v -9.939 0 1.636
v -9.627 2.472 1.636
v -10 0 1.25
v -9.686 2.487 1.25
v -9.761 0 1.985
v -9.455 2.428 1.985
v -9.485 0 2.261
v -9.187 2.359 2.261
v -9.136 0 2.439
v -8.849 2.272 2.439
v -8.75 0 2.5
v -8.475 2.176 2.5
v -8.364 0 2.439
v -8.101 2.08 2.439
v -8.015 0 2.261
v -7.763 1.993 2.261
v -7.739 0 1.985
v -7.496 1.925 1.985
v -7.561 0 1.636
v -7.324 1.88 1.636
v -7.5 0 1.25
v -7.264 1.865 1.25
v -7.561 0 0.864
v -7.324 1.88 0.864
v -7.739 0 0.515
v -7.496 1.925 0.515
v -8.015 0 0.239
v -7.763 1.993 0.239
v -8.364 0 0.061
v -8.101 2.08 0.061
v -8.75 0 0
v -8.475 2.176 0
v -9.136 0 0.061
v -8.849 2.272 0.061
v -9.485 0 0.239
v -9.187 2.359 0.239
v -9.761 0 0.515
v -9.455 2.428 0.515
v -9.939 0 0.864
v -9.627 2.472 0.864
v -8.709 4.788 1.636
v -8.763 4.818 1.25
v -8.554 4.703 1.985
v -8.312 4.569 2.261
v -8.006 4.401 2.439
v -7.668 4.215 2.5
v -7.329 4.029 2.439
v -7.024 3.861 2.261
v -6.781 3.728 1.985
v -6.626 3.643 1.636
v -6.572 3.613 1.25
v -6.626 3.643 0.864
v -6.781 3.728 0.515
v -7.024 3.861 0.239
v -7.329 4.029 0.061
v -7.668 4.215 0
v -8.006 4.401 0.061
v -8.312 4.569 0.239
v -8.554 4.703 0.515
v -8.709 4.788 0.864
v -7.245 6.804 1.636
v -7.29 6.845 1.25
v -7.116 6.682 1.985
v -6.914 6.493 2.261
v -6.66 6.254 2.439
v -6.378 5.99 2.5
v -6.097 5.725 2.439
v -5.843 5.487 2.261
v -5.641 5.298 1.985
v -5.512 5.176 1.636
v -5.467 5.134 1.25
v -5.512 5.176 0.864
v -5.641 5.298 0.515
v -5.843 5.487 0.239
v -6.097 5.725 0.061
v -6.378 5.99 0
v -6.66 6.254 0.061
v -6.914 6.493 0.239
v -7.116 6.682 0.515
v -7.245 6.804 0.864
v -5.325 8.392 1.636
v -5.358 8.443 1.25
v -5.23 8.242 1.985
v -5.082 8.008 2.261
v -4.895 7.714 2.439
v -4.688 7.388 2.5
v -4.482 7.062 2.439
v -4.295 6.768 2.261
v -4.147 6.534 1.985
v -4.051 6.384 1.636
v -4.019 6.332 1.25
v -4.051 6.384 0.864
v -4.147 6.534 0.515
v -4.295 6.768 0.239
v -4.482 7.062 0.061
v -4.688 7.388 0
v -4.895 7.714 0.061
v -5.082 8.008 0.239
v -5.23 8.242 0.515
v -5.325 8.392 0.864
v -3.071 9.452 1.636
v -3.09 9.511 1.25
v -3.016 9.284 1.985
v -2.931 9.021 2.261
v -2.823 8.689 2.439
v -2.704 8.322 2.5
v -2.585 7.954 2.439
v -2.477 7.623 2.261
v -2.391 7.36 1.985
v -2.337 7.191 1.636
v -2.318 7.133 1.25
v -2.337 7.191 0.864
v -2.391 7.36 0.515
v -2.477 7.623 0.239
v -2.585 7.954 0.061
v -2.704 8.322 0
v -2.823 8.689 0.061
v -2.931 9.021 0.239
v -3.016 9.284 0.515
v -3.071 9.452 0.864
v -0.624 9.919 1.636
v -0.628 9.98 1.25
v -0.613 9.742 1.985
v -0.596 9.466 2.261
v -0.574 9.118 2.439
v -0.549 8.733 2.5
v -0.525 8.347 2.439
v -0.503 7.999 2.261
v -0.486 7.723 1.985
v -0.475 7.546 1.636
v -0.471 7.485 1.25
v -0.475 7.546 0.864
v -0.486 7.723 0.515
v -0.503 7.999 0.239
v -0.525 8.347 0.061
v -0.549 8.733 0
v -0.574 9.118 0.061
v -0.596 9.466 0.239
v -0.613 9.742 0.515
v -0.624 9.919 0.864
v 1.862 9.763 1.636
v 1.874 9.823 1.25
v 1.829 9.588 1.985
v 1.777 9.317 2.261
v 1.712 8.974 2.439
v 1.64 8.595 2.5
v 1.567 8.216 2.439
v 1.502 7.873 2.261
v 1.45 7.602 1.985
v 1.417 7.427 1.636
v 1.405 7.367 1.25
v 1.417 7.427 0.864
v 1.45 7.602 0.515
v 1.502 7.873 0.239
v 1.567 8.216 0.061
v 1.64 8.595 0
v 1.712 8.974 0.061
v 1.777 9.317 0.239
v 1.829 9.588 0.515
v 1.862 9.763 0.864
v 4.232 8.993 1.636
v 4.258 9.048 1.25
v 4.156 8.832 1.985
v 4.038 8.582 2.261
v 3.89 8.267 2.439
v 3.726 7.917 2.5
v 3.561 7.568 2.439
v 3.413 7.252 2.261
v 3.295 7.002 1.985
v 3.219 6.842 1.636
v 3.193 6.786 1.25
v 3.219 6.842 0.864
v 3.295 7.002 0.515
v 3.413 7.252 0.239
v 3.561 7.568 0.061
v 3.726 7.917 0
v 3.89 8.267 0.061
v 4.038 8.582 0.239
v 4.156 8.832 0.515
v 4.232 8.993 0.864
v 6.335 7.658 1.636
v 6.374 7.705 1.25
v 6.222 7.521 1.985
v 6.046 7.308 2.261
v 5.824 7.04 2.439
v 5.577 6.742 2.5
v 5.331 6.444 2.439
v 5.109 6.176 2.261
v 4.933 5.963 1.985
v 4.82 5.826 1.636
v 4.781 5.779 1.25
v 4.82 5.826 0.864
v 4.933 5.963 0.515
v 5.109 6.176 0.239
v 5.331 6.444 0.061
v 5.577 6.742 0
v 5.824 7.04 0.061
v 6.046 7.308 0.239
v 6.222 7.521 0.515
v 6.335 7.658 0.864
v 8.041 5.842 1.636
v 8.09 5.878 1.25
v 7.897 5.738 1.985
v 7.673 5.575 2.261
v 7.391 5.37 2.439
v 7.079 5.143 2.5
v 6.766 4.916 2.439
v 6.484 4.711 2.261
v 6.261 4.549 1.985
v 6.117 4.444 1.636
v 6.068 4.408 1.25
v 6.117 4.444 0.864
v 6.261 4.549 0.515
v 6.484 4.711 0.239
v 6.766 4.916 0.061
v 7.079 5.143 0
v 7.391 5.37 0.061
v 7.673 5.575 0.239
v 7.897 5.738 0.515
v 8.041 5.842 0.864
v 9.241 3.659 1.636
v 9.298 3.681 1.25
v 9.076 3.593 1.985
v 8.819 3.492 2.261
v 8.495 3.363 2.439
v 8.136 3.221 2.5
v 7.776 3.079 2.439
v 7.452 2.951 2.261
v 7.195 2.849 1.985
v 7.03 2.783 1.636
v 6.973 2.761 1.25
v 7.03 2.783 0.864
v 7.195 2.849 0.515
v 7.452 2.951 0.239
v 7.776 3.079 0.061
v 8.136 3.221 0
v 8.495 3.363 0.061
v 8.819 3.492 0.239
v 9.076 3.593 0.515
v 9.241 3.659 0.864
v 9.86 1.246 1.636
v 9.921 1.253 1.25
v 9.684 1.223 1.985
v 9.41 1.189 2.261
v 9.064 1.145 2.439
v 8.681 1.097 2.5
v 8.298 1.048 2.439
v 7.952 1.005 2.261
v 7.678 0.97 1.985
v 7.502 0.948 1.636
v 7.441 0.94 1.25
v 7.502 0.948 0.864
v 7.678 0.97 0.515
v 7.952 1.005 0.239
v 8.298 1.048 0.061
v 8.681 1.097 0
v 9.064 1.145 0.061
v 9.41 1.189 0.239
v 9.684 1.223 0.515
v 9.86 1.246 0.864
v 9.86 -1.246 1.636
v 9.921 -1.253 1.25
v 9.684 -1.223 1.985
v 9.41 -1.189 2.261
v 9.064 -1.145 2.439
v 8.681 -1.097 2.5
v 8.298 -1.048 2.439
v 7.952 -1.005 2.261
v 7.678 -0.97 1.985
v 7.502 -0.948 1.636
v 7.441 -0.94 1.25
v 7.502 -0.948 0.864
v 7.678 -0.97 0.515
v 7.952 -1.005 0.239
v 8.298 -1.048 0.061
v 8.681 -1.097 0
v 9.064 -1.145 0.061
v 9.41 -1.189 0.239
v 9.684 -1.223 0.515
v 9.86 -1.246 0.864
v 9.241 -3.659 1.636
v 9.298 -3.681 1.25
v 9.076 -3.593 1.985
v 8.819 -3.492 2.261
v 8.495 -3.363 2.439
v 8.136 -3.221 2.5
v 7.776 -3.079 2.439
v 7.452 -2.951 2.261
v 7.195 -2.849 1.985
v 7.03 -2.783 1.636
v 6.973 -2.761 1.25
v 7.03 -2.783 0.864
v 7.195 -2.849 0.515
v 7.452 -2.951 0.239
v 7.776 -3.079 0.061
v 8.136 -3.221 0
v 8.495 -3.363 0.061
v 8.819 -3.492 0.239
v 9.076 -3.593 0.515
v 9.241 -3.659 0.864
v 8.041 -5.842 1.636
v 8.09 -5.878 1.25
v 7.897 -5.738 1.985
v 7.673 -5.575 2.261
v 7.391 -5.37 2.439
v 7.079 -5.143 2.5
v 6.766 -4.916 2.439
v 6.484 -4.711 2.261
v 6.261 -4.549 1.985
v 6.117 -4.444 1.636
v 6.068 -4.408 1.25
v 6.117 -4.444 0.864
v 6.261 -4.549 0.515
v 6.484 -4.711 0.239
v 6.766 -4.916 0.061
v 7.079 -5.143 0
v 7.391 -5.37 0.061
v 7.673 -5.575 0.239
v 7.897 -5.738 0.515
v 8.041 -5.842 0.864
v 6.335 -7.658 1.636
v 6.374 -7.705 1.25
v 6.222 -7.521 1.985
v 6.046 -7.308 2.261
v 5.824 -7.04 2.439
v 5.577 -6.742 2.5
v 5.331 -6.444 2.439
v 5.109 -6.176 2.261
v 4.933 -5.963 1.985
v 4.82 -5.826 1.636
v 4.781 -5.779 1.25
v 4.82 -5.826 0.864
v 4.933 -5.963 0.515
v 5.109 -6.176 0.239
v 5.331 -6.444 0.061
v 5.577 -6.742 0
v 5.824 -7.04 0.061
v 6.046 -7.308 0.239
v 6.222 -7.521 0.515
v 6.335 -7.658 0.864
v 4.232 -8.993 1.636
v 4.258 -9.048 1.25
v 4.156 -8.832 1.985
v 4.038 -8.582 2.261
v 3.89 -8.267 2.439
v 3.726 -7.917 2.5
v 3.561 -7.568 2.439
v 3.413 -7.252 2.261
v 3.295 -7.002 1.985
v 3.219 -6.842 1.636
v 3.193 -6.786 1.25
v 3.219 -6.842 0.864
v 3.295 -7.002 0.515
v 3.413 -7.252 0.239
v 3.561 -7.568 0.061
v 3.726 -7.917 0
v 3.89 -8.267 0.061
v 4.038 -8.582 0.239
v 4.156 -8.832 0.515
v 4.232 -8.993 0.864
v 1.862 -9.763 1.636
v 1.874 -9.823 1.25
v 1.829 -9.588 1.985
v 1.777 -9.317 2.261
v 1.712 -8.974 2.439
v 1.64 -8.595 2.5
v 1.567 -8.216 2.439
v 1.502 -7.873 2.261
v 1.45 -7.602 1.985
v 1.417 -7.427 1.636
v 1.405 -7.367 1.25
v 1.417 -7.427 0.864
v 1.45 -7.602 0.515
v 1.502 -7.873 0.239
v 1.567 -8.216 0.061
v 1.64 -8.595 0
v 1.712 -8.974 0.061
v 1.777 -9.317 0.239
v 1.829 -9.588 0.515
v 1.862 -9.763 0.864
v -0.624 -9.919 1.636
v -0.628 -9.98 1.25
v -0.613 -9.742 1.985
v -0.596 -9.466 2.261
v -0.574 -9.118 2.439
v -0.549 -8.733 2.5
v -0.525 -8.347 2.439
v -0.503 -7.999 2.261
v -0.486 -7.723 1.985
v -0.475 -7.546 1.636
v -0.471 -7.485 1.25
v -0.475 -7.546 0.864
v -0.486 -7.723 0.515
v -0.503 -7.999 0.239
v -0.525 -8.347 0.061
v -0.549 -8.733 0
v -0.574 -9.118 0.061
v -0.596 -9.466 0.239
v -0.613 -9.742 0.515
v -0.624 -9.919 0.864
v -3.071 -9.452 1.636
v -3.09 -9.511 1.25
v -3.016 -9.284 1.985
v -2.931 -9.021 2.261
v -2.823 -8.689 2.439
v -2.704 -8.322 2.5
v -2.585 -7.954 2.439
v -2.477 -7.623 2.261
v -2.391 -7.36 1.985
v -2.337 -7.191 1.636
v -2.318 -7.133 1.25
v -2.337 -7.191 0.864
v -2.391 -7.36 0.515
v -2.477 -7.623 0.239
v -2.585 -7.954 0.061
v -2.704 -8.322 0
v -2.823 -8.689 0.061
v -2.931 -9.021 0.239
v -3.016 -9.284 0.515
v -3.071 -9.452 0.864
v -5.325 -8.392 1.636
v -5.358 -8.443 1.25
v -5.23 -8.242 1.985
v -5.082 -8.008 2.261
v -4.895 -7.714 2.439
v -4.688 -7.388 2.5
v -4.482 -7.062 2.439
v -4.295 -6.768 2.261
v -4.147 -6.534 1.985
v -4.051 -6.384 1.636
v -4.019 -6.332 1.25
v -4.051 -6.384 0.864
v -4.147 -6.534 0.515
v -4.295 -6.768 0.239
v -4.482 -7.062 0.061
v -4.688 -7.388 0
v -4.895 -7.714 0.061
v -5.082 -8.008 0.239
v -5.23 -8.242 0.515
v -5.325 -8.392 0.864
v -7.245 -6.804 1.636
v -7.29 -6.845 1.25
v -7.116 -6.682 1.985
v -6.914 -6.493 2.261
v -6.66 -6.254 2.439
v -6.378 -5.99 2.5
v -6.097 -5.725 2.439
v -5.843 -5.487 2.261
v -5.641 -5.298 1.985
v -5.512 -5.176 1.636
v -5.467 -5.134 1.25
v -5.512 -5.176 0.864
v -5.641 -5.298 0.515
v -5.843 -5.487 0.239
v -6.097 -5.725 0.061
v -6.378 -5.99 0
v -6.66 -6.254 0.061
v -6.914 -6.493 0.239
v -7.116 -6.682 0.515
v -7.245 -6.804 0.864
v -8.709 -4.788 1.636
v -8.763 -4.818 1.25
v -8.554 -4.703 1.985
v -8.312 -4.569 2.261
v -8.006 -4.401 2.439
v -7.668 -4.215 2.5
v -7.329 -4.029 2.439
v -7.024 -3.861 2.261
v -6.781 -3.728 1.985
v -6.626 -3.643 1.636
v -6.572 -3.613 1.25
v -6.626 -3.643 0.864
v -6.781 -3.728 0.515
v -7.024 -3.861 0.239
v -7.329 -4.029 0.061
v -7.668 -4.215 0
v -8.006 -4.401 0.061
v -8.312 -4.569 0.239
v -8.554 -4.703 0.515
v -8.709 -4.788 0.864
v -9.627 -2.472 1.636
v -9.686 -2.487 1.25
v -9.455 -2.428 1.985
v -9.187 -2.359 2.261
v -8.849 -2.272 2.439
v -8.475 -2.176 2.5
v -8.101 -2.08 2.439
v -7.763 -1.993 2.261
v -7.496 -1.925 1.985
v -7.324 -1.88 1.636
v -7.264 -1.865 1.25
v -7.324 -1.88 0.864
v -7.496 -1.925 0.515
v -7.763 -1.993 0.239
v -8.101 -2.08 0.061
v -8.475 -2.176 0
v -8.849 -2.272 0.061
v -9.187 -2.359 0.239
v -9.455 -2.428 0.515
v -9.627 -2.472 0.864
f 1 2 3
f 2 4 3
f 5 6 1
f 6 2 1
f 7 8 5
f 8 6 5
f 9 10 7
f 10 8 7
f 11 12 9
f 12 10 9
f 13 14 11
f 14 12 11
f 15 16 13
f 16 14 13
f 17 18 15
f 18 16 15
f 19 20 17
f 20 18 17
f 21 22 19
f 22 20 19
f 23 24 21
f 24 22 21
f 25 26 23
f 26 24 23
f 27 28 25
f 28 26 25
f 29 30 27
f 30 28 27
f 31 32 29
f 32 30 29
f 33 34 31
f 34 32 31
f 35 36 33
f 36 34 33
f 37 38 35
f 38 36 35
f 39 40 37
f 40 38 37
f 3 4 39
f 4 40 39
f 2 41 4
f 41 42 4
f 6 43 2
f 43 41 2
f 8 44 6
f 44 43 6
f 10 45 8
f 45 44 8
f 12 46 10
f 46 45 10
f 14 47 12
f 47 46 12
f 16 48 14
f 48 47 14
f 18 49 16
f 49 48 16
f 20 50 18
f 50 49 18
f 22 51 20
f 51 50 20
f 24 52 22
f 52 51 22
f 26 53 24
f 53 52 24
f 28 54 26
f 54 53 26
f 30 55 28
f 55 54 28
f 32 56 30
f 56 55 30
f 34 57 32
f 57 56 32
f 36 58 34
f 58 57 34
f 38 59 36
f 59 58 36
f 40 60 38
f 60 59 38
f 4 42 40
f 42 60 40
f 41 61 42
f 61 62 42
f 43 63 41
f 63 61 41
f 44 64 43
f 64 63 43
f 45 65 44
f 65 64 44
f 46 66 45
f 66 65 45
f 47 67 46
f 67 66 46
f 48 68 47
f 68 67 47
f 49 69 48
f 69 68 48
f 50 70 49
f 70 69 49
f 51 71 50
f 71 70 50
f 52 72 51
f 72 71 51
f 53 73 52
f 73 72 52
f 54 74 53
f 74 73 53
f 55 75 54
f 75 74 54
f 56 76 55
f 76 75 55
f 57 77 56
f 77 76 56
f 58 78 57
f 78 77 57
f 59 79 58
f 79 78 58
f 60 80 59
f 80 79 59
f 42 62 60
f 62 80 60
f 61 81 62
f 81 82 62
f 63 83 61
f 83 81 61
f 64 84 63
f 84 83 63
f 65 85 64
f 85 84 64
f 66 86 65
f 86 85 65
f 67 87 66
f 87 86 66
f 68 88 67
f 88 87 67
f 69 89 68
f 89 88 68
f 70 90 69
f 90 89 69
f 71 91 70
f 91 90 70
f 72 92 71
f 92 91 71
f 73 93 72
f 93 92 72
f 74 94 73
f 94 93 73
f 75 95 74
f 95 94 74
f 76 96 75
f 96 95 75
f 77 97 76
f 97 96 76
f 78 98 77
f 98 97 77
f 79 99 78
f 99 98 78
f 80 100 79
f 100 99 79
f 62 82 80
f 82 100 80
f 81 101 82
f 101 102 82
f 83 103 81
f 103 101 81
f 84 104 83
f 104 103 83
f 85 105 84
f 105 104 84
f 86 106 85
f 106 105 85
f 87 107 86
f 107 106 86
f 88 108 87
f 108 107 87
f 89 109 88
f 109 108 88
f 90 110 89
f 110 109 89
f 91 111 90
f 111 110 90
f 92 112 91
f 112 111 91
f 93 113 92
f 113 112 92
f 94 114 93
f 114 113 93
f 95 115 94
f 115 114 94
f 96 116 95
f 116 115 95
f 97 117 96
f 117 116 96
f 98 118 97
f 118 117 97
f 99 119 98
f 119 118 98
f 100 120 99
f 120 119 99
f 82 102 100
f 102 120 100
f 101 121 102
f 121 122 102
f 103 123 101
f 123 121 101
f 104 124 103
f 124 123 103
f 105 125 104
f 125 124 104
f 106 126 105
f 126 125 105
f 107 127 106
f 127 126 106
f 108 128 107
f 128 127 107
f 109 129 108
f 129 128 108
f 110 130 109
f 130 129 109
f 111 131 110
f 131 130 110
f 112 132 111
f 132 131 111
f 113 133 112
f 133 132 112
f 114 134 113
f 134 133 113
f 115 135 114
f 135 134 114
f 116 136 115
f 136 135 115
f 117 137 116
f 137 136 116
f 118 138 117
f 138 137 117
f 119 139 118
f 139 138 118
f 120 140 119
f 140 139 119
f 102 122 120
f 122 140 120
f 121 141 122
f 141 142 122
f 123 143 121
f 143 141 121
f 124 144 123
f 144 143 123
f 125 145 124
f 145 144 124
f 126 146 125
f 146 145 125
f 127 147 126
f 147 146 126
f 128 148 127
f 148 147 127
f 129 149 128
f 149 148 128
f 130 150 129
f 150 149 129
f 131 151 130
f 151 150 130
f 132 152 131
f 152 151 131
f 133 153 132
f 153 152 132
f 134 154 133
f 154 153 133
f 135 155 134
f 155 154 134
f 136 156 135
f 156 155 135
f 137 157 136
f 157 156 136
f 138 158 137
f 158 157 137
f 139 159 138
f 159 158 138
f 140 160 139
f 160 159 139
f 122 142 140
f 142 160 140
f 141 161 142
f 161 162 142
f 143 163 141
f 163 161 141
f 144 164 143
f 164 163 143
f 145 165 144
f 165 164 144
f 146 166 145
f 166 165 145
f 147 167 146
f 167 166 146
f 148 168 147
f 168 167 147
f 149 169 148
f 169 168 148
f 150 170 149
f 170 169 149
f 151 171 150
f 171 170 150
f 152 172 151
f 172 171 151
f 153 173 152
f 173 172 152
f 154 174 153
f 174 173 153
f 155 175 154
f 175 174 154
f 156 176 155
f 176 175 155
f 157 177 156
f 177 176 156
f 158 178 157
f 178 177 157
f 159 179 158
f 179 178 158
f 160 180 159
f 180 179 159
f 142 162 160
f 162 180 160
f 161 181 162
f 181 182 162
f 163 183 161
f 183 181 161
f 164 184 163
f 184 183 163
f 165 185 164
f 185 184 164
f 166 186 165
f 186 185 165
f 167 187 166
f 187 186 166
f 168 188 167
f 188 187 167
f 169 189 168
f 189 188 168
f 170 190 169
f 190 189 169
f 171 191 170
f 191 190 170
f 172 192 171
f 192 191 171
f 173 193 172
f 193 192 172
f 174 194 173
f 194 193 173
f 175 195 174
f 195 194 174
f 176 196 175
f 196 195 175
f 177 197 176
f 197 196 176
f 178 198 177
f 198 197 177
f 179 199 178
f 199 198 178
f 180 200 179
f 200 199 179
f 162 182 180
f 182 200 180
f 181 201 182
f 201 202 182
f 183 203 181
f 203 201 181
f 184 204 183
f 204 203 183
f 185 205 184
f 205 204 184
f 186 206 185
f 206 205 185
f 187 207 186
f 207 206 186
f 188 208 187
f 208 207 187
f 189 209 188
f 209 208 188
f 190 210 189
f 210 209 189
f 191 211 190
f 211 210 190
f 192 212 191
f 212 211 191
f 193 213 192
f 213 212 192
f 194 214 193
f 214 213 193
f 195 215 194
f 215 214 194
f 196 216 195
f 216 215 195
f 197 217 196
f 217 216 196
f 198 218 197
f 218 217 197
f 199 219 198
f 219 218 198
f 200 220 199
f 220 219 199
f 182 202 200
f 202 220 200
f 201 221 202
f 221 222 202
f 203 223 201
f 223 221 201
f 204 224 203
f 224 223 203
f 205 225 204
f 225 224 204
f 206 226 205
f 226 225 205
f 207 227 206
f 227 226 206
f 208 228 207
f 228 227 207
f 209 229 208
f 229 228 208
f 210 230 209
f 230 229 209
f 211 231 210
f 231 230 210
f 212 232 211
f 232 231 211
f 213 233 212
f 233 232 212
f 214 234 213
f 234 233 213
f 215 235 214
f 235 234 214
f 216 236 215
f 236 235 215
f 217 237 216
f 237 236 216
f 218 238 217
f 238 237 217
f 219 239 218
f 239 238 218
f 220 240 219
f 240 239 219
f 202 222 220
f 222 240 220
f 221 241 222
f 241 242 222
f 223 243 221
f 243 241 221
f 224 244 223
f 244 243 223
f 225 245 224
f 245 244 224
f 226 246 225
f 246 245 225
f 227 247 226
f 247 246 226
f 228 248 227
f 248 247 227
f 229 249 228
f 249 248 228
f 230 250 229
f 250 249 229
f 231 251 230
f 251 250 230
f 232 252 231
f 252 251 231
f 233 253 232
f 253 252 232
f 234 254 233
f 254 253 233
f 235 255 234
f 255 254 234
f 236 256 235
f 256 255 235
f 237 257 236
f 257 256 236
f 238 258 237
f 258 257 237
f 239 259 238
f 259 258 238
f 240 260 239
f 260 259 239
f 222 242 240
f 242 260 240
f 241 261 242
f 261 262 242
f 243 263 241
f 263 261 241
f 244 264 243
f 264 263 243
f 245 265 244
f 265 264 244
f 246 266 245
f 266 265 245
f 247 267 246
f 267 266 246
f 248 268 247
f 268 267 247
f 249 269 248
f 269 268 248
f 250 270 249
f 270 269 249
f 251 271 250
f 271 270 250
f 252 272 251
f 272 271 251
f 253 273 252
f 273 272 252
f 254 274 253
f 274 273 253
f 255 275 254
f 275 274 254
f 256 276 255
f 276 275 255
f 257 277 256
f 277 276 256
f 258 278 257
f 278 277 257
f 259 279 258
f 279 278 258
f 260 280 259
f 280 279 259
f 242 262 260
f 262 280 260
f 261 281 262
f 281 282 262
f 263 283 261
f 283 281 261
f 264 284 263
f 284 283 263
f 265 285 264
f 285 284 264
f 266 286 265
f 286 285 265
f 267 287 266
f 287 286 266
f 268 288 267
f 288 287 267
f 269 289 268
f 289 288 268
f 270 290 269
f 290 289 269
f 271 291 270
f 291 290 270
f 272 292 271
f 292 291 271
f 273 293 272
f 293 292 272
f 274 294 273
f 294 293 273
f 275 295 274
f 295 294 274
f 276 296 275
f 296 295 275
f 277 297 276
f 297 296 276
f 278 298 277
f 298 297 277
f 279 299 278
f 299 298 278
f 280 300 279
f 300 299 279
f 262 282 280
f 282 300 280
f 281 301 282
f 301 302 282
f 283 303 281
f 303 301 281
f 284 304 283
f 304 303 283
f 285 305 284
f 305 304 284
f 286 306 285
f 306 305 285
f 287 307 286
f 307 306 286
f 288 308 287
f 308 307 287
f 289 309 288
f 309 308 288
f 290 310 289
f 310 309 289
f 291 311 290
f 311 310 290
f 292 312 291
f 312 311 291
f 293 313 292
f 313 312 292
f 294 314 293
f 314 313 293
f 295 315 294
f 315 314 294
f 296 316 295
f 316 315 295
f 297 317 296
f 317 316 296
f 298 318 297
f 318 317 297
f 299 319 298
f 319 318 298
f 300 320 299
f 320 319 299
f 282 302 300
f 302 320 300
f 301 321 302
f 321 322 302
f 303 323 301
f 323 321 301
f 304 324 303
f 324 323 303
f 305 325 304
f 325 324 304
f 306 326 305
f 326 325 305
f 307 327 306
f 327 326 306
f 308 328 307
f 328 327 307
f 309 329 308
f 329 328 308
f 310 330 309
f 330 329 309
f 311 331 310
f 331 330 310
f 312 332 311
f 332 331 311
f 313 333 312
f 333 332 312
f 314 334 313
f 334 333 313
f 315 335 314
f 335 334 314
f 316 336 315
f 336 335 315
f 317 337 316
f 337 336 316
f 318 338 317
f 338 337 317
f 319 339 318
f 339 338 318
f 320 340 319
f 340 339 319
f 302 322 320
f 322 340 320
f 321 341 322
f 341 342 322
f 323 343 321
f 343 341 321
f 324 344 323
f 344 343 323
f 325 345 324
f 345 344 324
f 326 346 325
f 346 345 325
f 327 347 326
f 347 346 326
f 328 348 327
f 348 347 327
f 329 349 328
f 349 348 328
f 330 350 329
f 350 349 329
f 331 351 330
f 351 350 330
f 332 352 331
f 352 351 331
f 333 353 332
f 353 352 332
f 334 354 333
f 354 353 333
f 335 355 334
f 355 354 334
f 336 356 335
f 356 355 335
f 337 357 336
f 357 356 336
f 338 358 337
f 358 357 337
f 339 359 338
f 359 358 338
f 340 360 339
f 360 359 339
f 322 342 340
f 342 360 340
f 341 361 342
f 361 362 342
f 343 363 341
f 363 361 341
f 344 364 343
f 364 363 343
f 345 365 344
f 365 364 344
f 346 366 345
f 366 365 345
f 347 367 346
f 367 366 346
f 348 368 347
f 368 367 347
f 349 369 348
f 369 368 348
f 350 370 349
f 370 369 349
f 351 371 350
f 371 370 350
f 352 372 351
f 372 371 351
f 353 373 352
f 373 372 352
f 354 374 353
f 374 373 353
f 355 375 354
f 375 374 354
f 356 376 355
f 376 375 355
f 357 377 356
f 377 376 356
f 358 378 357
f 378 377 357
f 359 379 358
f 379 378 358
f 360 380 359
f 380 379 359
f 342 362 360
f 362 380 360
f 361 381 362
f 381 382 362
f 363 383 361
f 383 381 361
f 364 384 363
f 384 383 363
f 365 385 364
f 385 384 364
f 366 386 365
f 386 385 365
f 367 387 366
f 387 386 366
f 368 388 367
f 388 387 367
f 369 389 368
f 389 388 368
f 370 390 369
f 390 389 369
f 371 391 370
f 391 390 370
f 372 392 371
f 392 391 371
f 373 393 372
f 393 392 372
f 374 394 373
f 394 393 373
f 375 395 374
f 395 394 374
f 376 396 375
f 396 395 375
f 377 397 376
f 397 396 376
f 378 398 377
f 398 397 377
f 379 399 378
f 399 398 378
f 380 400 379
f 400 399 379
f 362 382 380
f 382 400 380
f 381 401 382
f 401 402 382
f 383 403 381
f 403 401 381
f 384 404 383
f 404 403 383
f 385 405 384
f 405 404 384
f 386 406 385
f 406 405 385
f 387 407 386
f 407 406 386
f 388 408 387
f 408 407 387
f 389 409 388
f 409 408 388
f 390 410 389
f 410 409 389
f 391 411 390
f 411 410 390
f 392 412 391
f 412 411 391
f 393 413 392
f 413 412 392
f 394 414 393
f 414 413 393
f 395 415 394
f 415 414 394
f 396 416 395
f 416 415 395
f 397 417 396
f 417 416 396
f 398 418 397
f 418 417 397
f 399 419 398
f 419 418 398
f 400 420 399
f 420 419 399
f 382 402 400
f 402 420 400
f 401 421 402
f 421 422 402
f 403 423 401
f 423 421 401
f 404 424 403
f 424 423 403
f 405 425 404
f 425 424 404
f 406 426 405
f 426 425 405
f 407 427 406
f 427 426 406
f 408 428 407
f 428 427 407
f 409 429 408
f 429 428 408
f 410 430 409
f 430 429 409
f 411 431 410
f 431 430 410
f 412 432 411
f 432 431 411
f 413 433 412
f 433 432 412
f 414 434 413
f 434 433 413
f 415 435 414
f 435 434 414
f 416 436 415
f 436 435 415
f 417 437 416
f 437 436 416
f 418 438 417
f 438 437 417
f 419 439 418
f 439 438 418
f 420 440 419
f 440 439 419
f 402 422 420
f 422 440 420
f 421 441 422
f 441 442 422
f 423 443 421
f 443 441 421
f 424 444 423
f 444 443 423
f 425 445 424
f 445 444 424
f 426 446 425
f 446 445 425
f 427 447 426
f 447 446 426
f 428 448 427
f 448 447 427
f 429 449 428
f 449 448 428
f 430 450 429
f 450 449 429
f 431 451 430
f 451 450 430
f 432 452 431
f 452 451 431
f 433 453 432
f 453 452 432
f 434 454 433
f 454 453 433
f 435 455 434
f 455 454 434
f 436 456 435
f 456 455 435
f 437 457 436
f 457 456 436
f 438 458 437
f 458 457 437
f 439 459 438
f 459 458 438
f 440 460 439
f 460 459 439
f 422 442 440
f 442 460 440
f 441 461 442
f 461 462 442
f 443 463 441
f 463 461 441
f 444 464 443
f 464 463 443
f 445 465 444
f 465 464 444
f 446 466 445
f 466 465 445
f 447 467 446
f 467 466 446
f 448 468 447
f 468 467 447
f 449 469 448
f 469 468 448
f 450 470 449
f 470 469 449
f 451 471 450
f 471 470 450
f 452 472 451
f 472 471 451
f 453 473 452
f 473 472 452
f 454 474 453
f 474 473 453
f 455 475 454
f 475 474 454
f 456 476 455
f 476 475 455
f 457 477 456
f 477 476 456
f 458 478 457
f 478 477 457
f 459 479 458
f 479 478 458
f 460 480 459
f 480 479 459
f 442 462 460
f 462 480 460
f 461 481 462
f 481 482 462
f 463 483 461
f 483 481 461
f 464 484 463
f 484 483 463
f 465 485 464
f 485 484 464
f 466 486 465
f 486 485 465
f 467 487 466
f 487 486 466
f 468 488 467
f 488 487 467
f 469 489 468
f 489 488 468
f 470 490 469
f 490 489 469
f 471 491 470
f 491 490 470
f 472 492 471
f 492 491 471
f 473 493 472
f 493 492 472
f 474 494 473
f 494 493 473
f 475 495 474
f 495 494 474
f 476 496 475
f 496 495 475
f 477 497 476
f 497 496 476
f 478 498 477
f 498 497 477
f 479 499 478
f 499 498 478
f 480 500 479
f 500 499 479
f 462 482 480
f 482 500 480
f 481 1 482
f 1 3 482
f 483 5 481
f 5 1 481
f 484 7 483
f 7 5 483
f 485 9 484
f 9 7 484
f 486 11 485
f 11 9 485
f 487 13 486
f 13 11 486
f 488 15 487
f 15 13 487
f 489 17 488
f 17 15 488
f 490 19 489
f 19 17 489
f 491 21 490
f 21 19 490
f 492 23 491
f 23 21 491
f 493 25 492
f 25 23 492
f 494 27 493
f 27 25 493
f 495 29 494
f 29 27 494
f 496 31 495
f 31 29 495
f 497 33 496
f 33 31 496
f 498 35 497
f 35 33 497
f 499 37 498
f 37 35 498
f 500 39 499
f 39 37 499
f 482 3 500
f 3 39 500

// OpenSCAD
// NAME: O Ring 15 x 2.5
// CATEGORY: Wheel
// COLOR: 0

module o_ring_15(){
    rotate_extrude(convexity = 2, $fn=25)
        translate([(15+2.5)/2, 0, 0])
        circle(d = 2.5, $fn=20);
}

translate([0, 0, 2.5/2])
    color("black")
    o_ring_15();
